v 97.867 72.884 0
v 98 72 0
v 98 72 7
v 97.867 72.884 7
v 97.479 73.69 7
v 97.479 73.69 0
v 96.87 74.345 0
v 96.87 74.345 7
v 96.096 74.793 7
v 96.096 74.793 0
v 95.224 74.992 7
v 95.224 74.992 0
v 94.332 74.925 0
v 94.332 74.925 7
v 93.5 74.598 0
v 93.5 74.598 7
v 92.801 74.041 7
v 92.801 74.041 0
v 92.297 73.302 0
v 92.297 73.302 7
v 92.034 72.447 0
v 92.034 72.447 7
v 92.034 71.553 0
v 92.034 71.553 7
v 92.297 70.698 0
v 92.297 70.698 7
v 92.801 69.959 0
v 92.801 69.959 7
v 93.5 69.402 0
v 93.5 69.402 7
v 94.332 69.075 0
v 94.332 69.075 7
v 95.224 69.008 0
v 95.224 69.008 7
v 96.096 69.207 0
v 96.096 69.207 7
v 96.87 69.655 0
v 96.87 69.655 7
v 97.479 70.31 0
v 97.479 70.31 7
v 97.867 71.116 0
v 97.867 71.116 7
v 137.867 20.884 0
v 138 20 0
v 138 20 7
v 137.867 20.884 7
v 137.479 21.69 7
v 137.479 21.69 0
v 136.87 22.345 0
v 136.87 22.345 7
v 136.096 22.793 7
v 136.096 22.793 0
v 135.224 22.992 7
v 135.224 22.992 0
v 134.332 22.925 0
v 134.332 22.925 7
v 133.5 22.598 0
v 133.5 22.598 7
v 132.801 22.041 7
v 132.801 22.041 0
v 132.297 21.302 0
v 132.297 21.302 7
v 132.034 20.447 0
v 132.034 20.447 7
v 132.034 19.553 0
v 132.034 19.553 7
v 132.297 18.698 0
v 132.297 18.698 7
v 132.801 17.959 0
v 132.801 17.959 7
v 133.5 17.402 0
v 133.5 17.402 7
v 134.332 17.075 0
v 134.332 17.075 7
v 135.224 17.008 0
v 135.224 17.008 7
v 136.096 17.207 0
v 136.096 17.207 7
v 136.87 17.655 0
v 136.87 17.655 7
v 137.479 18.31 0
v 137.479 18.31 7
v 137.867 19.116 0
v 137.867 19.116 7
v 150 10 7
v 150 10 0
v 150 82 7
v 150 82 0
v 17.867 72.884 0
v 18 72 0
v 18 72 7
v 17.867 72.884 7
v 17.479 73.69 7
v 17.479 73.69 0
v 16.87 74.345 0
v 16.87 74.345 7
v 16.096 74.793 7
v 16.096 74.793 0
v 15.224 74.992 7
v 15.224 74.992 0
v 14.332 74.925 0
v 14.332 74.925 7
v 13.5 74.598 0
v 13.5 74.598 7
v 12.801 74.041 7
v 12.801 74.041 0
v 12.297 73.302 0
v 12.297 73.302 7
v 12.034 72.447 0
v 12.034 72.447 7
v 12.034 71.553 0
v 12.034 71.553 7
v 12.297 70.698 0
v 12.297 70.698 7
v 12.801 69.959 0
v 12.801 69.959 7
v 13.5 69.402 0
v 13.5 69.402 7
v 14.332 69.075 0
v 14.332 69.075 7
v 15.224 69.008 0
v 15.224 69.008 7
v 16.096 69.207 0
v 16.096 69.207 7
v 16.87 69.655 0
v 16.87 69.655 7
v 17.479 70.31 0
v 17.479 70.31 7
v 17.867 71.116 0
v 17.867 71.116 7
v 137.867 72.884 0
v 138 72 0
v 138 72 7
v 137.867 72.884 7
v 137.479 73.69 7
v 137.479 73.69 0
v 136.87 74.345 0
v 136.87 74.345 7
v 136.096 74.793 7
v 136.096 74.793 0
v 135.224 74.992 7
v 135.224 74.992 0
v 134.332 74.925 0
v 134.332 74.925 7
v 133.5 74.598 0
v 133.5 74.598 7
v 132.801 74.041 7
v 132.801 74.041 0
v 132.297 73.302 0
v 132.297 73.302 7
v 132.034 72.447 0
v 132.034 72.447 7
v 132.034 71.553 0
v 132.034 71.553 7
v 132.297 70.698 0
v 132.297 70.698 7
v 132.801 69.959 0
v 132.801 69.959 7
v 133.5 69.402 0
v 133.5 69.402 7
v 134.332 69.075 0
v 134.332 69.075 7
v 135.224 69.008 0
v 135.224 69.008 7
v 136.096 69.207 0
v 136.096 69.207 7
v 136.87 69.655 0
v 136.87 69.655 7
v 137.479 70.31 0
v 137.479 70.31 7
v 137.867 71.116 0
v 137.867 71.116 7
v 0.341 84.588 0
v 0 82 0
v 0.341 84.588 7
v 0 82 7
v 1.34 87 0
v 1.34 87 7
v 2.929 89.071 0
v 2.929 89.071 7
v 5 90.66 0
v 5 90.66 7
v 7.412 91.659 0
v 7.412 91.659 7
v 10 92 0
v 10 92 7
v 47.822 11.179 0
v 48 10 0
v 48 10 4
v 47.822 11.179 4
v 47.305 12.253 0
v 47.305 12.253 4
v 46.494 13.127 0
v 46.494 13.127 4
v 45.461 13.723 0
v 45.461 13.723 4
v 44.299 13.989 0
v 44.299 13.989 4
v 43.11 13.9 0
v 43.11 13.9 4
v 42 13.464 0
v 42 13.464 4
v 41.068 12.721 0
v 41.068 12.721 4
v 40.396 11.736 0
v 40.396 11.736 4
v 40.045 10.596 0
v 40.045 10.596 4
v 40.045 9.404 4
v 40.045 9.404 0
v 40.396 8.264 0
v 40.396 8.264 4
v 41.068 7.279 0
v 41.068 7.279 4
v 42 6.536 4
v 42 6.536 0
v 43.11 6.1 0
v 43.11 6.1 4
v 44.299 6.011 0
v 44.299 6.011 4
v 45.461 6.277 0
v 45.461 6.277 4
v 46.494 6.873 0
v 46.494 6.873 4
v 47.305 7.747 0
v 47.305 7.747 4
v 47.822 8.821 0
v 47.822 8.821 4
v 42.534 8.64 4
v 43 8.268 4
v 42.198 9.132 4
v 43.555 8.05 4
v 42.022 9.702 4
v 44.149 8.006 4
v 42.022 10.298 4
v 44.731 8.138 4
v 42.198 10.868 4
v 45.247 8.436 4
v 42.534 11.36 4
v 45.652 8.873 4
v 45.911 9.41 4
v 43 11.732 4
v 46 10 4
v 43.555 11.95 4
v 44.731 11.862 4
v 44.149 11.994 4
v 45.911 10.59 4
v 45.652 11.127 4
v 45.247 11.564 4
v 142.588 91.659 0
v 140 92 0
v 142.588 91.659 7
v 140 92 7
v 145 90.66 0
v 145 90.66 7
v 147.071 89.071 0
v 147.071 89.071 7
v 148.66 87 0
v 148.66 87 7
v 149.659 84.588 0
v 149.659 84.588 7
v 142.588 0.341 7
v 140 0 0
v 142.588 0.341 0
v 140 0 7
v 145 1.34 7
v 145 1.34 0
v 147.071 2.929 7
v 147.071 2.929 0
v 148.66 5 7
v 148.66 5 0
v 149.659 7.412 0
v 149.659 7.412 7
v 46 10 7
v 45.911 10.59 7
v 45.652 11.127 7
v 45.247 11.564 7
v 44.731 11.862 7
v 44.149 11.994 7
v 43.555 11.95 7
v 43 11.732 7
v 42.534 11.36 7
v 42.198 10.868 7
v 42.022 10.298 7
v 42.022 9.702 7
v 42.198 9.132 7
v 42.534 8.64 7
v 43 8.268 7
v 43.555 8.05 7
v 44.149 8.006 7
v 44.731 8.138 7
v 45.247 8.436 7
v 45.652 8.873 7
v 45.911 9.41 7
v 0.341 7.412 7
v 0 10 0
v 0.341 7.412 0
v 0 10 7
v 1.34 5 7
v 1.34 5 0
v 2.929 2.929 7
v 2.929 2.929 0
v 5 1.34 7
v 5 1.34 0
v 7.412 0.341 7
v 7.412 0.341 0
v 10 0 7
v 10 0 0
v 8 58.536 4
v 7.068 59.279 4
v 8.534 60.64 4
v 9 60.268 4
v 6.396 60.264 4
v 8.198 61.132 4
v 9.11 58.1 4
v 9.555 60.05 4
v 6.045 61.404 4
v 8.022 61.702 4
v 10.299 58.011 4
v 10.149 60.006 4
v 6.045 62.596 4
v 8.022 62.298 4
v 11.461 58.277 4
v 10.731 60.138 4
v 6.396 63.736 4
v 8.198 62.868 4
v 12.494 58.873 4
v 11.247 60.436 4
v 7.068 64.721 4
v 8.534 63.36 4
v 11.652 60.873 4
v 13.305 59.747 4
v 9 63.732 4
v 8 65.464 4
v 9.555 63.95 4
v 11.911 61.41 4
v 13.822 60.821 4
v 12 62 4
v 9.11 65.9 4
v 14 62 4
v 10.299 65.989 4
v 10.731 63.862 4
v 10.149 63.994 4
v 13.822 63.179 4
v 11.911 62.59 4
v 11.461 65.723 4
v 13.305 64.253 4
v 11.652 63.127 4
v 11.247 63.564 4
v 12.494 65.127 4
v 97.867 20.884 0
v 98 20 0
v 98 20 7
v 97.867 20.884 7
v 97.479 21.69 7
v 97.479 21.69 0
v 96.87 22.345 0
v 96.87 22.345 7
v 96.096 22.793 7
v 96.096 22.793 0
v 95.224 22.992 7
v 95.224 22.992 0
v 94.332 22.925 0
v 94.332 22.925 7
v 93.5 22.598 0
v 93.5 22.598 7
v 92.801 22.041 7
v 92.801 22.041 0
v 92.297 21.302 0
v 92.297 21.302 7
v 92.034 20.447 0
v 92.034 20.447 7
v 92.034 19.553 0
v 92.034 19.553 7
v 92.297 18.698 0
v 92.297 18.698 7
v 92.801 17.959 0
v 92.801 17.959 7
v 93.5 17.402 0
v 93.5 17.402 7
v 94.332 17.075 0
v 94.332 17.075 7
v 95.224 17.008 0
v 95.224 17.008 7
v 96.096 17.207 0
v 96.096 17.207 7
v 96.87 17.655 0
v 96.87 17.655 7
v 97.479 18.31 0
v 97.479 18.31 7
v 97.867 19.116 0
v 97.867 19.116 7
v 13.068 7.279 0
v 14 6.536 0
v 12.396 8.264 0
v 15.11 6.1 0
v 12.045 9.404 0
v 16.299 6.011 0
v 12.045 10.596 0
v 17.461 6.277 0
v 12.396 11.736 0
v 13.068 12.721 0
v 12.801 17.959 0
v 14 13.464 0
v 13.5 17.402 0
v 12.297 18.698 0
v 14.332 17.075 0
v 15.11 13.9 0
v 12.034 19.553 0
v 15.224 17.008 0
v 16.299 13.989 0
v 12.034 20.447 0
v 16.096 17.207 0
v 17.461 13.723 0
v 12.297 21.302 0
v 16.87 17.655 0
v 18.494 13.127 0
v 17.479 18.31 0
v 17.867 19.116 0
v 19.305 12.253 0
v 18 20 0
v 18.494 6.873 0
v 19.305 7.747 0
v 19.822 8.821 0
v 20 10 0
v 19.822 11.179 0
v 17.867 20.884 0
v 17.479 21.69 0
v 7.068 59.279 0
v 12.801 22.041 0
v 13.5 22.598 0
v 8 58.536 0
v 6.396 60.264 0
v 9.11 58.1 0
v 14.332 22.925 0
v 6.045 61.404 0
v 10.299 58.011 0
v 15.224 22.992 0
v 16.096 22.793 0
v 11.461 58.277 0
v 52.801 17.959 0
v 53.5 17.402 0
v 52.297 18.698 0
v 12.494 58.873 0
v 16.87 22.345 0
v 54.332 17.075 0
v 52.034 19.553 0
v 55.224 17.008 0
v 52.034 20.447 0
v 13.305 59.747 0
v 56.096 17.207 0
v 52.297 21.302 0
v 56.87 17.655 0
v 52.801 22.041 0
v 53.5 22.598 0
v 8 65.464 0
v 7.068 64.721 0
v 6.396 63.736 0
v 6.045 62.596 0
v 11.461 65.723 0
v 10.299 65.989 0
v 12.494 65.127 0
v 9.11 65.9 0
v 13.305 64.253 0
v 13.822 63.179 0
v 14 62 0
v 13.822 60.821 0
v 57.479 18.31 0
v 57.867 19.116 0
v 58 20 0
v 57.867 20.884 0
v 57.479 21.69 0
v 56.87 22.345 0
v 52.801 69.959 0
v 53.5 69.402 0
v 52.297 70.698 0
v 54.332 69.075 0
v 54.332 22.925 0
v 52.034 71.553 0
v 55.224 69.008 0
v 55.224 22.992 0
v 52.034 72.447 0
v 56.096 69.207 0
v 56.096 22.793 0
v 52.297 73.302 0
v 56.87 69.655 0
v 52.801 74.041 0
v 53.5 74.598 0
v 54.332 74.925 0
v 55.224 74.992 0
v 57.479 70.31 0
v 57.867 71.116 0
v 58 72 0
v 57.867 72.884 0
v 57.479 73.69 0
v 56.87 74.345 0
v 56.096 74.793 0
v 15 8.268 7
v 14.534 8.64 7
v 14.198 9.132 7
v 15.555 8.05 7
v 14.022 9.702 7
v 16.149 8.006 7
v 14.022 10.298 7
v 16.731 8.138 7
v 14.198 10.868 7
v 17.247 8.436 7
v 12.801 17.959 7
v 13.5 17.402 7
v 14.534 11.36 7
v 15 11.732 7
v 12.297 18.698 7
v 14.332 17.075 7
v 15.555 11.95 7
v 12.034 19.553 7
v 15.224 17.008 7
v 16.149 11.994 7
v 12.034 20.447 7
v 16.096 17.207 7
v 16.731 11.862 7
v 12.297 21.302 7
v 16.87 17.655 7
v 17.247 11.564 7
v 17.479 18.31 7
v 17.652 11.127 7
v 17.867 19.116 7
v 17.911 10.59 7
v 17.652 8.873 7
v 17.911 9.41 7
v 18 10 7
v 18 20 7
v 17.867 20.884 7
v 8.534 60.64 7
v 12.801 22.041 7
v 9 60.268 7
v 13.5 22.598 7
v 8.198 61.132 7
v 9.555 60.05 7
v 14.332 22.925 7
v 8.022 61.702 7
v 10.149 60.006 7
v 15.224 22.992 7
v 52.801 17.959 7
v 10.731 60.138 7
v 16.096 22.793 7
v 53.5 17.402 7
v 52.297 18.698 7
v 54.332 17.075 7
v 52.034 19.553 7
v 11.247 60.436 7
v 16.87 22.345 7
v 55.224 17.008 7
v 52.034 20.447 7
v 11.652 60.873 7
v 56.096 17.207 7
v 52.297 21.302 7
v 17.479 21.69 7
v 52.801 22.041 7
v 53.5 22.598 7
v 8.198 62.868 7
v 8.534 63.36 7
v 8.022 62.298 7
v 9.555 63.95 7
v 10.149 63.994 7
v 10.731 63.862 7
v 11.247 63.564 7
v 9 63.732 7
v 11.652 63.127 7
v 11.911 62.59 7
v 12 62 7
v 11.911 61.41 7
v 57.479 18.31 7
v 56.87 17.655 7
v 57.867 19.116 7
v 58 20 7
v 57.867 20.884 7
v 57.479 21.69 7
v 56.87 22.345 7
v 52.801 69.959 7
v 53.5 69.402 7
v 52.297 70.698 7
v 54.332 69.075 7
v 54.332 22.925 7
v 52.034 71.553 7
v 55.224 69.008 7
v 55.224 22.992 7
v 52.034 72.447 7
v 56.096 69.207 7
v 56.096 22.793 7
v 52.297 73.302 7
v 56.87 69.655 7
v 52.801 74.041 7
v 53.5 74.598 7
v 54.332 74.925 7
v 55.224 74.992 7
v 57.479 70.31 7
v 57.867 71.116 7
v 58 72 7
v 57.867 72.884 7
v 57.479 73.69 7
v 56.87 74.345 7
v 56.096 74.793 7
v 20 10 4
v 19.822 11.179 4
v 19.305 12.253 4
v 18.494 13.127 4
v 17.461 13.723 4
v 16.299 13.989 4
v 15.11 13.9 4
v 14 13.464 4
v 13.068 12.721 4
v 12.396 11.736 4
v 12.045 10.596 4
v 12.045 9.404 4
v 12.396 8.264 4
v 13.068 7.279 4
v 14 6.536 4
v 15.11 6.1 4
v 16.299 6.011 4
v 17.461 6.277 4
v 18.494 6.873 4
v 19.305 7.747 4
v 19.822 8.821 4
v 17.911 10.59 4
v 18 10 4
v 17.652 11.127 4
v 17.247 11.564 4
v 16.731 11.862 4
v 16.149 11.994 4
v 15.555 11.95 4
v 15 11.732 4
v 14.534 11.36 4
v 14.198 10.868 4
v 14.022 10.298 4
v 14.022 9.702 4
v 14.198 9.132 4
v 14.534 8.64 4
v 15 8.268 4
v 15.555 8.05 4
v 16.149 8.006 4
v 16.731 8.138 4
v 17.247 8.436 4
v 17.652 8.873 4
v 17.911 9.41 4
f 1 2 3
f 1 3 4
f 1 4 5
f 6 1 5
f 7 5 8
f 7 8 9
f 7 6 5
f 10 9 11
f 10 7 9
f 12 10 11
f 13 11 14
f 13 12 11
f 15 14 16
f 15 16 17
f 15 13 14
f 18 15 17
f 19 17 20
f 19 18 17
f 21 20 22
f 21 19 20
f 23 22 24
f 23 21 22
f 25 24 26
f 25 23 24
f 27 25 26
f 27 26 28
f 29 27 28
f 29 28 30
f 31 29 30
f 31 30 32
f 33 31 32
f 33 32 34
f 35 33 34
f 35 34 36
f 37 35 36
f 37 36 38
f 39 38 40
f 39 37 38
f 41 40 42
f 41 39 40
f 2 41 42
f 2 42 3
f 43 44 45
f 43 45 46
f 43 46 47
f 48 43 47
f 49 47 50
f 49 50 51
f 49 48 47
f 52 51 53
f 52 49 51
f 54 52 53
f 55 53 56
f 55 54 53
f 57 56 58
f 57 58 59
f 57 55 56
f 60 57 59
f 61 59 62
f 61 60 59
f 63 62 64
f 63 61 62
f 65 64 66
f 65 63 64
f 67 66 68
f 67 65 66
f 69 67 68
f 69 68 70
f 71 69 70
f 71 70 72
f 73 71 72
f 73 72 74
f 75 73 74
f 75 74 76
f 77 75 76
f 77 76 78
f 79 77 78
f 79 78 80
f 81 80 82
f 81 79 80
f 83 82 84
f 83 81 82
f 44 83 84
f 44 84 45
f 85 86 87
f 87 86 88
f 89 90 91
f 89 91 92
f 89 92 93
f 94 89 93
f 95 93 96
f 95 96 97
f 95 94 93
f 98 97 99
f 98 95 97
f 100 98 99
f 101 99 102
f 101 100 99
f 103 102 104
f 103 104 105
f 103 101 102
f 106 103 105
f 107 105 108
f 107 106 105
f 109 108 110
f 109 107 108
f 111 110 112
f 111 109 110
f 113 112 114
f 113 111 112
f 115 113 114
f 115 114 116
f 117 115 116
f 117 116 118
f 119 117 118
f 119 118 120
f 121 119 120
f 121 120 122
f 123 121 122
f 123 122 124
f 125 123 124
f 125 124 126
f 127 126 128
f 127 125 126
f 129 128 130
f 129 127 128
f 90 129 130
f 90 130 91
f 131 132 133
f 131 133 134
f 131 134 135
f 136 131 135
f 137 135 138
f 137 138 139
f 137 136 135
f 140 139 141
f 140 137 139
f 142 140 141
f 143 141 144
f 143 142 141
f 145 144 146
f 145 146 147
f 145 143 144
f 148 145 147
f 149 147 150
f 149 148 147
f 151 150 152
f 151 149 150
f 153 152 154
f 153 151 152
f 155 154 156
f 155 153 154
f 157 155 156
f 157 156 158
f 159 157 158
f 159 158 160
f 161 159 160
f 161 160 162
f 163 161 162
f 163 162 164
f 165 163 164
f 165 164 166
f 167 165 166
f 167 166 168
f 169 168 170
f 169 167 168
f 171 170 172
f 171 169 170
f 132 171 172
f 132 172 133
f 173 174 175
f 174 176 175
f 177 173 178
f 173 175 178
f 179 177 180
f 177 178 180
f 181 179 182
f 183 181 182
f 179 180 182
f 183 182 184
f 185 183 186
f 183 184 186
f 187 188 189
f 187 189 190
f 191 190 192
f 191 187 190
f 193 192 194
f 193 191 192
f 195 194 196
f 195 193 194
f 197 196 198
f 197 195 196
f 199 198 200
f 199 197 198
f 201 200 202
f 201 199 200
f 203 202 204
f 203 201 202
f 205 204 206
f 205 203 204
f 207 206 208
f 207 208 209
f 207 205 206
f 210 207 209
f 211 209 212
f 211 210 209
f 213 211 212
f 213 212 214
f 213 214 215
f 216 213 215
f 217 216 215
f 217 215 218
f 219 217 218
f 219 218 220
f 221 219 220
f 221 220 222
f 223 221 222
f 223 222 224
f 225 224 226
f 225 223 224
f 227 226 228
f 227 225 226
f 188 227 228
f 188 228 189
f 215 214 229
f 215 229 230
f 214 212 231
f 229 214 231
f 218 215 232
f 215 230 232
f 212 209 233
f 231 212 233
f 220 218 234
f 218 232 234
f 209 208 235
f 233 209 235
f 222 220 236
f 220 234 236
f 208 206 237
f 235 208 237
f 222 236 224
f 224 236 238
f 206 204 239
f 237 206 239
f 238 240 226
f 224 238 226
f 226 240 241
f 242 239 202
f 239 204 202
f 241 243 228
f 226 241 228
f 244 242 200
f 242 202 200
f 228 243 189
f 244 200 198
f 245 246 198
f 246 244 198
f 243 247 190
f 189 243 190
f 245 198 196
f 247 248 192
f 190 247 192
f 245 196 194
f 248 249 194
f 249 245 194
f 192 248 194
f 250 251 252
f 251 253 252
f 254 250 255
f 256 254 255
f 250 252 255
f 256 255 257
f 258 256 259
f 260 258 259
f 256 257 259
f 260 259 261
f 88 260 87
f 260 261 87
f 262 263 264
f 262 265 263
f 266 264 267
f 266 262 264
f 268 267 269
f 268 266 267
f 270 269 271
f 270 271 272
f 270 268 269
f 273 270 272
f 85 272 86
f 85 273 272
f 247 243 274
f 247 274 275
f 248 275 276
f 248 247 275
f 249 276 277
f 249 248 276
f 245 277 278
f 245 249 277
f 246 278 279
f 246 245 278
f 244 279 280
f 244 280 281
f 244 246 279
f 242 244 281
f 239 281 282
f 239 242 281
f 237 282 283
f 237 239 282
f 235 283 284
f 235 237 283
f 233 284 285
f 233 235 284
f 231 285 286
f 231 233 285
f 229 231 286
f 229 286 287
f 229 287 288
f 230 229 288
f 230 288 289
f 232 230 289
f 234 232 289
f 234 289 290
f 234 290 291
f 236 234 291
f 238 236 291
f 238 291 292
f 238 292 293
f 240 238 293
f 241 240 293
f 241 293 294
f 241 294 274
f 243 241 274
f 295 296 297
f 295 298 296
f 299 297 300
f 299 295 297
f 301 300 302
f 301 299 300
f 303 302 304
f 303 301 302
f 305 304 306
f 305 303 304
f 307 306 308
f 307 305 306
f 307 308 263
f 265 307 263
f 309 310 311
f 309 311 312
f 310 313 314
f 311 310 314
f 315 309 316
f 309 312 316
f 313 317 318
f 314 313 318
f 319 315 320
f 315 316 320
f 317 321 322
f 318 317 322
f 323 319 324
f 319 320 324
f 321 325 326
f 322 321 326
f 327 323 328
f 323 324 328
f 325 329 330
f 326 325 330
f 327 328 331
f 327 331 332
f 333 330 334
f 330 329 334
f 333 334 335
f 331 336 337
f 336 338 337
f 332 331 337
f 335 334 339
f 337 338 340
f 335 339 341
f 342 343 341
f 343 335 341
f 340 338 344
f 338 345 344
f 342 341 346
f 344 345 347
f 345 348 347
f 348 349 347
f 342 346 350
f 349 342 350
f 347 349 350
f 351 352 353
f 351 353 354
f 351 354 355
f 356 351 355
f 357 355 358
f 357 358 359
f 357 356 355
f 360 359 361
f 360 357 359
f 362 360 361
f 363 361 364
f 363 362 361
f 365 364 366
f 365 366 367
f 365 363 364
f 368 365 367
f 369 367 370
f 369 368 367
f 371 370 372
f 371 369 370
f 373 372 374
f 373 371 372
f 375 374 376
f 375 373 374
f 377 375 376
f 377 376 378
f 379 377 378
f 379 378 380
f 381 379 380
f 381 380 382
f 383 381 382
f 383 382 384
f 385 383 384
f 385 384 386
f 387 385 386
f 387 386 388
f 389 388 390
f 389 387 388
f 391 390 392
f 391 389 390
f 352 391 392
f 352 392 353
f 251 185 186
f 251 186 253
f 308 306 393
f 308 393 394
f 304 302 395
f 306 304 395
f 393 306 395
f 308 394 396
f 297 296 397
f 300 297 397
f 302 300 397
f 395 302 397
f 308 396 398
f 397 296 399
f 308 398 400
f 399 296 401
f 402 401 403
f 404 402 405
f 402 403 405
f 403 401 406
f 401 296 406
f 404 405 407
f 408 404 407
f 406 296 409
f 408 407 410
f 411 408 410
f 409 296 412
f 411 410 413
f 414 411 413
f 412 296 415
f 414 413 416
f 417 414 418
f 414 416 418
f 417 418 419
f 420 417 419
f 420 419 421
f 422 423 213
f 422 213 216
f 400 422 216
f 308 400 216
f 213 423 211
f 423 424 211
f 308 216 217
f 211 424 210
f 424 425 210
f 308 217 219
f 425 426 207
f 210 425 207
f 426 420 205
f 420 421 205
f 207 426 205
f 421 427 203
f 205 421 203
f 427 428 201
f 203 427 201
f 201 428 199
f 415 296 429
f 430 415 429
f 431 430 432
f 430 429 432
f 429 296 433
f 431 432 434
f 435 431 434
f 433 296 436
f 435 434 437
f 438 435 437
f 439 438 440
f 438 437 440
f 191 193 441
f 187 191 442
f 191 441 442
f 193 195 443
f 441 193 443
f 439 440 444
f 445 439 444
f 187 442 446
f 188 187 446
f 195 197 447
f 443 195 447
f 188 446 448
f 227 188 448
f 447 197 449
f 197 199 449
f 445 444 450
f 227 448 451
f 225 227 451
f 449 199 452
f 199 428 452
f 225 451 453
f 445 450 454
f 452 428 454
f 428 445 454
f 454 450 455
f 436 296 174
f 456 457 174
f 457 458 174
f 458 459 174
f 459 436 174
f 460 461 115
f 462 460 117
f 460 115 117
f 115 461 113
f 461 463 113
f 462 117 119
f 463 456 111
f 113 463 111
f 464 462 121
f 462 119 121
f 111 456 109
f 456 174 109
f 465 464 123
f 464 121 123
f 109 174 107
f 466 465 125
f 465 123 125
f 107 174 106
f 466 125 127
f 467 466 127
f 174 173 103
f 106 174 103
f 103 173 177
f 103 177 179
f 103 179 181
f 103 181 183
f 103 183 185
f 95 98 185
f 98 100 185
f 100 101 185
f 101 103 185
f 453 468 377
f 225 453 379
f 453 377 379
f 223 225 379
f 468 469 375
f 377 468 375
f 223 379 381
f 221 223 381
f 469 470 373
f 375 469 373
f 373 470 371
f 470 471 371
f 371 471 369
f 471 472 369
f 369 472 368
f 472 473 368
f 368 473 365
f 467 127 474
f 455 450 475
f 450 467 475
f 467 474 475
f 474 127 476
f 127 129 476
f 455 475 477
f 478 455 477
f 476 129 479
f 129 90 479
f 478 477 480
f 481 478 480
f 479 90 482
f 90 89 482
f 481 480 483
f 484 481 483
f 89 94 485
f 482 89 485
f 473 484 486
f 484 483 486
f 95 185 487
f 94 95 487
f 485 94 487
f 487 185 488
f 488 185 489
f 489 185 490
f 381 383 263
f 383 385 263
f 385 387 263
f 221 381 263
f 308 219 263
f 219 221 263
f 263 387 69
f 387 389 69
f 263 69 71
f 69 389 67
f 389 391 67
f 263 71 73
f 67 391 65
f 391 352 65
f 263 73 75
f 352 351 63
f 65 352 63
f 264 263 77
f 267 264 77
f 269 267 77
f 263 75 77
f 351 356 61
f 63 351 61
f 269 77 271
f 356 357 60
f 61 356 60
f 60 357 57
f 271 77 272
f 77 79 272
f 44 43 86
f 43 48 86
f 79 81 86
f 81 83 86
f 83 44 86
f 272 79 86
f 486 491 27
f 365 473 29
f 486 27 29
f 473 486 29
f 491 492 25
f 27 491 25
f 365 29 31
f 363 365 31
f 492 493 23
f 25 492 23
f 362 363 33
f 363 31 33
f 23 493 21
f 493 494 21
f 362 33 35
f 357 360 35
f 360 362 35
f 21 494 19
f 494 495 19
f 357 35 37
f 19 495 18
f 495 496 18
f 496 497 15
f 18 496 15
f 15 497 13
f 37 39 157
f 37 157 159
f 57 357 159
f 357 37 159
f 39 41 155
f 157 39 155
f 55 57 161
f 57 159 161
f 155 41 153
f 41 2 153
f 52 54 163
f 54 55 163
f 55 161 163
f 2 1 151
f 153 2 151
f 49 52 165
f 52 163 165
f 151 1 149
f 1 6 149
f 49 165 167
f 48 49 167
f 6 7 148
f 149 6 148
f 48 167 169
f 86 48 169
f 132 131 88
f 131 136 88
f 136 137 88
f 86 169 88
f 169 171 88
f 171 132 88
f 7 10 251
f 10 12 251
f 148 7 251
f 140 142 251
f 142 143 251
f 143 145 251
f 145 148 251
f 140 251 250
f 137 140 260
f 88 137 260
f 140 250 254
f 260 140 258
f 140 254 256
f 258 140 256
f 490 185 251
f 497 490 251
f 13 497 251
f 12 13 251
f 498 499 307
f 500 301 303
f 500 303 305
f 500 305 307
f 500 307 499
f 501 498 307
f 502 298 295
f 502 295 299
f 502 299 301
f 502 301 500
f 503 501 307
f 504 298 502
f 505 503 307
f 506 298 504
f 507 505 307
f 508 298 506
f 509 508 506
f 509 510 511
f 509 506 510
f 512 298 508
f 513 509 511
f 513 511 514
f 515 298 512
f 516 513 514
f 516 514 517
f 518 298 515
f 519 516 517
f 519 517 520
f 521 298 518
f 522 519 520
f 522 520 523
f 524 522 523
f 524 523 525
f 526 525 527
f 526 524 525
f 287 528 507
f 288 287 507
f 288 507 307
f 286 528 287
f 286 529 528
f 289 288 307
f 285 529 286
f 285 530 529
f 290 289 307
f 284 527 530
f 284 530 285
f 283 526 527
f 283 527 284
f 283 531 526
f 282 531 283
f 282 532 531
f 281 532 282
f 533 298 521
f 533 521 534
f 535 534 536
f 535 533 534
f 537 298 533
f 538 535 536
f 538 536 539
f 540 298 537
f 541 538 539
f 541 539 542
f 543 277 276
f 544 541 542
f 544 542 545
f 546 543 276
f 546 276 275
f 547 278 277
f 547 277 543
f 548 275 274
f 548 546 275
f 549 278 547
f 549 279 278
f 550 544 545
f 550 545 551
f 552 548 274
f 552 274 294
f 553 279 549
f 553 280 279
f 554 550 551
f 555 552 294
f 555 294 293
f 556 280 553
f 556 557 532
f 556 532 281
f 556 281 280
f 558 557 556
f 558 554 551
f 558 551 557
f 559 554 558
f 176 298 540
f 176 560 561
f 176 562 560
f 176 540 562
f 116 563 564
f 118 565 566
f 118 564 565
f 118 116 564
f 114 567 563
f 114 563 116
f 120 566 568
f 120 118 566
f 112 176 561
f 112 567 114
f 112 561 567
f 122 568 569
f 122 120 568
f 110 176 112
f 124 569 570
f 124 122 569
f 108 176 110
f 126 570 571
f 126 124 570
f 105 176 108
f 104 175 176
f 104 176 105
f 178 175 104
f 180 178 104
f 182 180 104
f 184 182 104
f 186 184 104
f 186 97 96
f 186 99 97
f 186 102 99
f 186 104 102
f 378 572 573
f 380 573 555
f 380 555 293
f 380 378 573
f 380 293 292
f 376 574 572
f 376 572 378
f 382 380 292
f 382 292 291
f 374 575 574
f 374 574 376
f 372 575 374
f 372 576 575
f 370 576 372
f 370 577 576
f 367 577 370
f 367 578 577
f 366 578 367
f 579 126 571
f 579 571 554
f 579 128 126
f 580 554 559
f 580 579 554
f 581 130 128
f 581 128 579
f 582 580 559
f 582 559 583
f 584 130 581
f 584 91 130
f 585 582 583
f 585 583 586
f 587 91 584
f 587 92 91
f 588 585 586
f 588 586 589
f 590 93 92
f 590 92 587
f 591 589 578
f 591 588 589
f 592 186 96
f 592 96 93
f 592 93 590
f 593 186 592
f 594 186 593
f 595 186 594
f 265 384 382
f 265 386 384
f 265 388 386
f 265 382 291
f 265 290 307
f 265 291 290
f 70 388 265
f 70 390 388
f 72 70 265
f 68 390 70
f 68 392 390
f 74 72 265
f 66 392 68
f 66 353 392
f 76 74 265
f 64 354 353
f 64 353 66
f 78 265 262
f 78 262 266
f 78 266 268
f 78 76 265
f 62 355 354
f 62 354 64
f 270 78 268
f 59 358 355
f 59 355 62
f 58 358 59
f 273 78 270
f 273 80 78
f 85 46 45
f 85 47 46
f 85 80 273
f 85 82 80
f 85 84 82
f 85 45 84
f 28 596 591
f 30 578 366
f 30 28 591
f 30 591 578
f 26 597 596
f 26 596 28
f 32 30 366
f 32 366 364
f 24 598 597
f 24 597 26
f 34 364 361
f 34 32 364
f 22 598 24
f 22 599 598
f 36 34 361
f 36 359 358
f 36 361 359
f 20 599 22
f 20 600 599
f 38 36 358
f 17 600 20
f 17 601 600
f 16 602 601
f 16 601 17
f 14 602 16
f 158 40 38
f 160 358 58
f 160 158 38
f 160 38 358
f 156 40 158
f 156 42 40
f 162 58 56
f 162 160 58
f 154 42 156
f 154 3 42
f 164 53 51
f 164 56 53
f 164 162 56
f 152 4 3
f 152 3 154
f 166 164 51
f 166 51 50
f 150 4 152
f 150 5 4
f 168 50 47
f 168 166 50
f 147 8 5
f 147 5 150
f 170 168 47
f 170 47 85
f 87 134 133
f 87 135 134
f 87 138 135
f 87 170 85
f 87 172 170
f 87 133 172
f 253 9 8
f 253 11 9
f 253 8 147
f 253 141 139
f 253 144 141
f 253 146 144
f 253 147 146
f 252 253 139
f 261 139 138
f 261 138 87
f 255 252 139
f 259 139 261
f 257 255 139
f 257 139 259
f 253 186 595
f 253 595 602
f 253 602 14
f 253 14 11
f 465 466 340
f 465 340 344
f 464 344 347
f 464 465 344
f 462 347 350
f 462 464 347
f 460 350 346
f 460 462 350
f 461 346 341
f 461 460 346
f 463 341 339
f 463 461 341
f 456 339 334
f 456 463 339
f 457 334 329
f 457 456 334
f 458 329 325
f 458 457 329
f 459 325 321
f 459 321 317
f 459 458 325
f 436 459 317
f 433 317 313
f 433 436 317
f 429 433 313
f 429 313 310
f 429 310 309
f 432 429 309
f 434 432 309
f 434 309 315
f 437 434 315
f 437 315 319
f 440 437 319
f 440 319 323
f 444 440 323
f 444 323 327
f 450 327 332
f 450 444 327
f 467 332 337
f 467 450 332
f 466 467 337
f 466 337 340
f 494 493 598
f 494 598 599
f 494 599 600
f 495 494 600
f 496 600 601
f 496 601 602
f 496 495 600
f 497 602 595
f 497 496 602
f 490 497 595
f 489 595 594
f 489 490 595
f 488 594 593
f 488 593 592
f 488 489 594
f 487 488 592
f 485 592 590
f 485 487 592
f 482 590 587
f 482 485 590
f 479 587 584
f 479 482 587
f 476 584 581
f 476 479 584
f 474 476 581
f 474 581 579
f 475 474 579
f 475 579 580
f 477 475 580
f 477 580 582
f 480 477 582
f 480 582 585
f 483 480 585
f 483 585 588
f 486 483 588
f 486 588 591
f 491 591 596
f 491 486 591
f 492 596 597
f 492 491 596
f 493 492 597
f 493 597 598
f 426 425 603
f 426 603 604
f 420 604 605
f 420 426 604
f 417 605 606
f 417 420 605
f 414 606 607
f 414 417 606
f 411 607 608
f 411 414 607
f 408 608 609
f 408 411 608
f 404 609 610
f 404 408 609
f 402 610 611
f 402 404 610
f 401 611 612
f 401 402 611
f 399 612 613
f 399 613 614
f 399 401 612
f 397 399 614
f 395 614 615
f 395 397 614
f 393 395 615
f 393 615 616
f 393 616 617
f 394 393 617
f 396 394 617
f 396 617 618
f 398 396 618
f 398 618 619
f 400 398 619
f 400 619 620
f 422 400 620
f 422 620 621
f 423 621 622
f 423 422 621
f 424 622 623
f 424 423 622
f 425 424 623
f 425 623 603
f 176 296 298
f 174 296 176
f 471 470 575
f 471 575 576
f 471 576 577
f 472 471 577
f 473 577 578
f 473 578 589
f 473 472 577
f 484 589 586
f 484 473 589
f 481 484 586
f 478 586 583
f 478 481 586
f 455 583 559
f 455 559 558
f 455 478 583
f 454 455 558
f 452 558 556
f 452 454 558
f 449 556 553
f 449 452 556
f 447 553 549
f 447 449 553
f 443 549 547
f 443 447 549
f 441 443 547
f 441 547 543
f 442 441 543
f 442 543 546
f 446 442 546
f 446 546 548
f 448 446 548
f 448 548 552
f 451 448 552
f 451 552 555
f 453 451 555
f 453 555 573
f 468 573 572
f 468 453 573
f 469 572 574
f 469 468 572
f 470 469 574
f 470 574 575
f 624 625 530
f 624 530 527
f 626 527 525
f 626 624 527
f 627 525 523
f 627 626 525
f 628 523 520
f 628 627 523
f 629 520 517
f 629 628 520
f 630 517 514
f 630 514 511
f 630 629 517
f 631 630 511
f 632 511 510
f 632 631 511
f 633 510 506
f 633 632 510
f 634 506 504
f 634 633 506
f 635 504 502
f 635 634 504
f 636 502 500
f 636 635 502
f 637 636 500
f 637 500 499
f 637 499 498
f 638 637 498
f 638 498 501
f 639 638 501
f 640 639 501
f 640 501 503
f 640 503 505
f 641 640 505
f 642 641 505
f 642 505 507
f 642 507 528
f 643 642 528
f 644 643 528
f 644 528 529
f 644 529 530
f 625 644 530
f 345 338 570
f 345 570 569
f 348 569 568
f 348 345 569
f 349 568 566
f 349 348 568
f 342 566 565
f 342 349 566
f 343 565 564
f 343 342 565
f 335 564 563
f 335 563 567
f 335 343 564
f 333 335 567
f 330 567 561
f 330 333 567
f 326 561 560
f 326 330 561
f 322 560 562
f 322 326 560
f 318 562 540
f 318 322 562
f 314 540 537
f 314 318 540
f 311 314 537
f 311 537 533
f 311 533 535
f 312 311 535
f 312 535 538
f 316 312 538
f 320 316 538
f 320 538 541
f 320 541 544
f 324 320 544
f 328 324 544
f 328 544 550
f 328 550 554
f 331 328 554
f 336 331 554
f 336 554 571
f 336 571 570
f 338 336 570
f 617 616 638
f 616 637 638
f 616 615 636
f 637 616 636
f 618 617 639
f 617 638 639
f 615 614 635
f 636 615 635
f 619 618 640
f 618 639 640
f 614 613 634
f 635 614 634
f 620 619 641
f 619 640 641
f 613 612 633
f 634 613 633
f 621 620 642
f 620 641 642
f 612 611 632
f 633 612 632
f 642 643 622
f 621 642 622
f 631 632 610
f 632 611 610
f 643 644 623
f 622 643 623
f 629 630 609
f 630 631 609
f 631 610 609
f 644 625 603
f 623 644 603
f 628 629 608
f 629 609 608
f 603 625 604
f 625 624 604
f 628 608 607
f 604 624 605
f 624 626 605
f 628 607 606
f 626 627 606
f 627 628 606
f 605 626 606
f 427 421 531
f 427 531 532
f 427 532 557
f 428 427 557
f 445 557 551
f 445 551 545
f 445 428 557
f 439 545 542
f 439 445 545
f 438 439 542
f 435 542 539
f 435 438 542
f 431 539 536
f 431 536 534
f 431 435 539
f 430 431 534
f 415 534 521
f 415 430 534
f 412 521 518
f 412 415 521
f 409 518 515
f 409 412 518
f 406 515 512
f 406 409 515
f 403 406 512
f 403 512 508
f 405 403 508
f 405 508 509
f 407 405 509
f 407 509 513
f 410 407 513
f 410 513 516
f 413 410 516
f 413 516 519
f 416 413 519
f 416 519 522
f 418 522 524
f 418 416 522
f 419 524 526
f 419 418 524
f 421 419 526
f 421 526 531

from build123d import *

# Parameters (mm, degrees)
F0_W     = 150
F0_H     = 92
F0_R     = 4
F0_R_2   = 3
F0_R_3   = 2
F1_DEPTH = 7
F2_R     = 10
F3_DEPTH = 4


with BuildPart() as f1:
    # F0 (on Top) → F1 (new body)
    with BuildSketch(Plane.XY):
        with Locations((75, 46)):
            Rectangle(F0_W, F0_H)
        with Locations((16, 10)):
            Circle(F0_R, mode=Mode.SUBTRACT)
        with Locations((15, 20)):
            Circle(F0_R_2, mode=Mode.SUBTRACT)
        with Locations((44, 10)):
            Circle(F0_R, mode=Mode.SUBTRACT)
        with Locations((55, 20)):
            Circle(F0_R_2, mode=Mode.SUBTRACT)
        with Locations((95, 20)):
            Circle(F0_R_2, mode=Mode.SUBTRACT)
        with Locations((135, 20)):
            Circle(F0_R_2, mode=Mode.SUBTRACT)
        with Locations((10, 62)):
            Circle(F0_R, mode=Mode.SUBTRACT)
        with Locations((15, 72)):
            Circle(F0_R_2, mode=Mode.SUBTRACT)
        with Locations((55, 72)):
            Circle(F0_R_2, mode=Mode.SUBTRACT)
        with Locations((95, 72)):
            Circle(F0_R_2, mode=Mode.SUBTRACT)
        with Locations((135, 72)):
            Circle(F0_R_2, mode=Mode.SUBTRACT)
        with Locations((10, 62)):
            Circle(F0_R)
        with Locations((10, 62)):
            Circle(F0_R_3, mode=Mode.SUBTRACT)
        with Locations((16, 10)):
            Circle(F0_R)
        with Locations((16, 10)):
            Circle(F0_R_3, mode=Mode.SUBTRACT)
        with Locations((44, 10)):
            Circle(F0_R)
        with Locations((44, 10)):
            Circle(F0_R_3, mode=Mode.SUBTRACT)
    extrude(amount=F1_DEPTH)

    # F2
    f2_edges = [f1.edges().sort_by_distance(p)[0] for p in [
        (0, 92, 3.5),
        (0, 0, 3.5),
        (150, 0, 3.5),
        (150, 92, 3.5),
    ]]
    fillet(f2_edges, radius=F2_R)

    # F0 (on Top) → F3 (cut)
    with BuildSketch(Plane.XY):
        with Locations((10, 62)):
            Circle(F0_R)
        with Locations((10, 62)):
            Circle(F0_R_3, mode=Mode.SUBTRACT)
        with Locations((16, 10)):
            Circle(F0_R)
        with Locations((16, 10)):
            Circle(F0_R_3, mode=Mode.SUBTRACT)
        with Locations((44, 10)):
            Circle(F0_R)
        with Locations((44, 10)):
            Circle(F0_R_3, mode=Mode.SUBTRACT)
    extrude(amount=F3_DEPTH, mode=Mode.SUBTRACT)


solid = f1.part
